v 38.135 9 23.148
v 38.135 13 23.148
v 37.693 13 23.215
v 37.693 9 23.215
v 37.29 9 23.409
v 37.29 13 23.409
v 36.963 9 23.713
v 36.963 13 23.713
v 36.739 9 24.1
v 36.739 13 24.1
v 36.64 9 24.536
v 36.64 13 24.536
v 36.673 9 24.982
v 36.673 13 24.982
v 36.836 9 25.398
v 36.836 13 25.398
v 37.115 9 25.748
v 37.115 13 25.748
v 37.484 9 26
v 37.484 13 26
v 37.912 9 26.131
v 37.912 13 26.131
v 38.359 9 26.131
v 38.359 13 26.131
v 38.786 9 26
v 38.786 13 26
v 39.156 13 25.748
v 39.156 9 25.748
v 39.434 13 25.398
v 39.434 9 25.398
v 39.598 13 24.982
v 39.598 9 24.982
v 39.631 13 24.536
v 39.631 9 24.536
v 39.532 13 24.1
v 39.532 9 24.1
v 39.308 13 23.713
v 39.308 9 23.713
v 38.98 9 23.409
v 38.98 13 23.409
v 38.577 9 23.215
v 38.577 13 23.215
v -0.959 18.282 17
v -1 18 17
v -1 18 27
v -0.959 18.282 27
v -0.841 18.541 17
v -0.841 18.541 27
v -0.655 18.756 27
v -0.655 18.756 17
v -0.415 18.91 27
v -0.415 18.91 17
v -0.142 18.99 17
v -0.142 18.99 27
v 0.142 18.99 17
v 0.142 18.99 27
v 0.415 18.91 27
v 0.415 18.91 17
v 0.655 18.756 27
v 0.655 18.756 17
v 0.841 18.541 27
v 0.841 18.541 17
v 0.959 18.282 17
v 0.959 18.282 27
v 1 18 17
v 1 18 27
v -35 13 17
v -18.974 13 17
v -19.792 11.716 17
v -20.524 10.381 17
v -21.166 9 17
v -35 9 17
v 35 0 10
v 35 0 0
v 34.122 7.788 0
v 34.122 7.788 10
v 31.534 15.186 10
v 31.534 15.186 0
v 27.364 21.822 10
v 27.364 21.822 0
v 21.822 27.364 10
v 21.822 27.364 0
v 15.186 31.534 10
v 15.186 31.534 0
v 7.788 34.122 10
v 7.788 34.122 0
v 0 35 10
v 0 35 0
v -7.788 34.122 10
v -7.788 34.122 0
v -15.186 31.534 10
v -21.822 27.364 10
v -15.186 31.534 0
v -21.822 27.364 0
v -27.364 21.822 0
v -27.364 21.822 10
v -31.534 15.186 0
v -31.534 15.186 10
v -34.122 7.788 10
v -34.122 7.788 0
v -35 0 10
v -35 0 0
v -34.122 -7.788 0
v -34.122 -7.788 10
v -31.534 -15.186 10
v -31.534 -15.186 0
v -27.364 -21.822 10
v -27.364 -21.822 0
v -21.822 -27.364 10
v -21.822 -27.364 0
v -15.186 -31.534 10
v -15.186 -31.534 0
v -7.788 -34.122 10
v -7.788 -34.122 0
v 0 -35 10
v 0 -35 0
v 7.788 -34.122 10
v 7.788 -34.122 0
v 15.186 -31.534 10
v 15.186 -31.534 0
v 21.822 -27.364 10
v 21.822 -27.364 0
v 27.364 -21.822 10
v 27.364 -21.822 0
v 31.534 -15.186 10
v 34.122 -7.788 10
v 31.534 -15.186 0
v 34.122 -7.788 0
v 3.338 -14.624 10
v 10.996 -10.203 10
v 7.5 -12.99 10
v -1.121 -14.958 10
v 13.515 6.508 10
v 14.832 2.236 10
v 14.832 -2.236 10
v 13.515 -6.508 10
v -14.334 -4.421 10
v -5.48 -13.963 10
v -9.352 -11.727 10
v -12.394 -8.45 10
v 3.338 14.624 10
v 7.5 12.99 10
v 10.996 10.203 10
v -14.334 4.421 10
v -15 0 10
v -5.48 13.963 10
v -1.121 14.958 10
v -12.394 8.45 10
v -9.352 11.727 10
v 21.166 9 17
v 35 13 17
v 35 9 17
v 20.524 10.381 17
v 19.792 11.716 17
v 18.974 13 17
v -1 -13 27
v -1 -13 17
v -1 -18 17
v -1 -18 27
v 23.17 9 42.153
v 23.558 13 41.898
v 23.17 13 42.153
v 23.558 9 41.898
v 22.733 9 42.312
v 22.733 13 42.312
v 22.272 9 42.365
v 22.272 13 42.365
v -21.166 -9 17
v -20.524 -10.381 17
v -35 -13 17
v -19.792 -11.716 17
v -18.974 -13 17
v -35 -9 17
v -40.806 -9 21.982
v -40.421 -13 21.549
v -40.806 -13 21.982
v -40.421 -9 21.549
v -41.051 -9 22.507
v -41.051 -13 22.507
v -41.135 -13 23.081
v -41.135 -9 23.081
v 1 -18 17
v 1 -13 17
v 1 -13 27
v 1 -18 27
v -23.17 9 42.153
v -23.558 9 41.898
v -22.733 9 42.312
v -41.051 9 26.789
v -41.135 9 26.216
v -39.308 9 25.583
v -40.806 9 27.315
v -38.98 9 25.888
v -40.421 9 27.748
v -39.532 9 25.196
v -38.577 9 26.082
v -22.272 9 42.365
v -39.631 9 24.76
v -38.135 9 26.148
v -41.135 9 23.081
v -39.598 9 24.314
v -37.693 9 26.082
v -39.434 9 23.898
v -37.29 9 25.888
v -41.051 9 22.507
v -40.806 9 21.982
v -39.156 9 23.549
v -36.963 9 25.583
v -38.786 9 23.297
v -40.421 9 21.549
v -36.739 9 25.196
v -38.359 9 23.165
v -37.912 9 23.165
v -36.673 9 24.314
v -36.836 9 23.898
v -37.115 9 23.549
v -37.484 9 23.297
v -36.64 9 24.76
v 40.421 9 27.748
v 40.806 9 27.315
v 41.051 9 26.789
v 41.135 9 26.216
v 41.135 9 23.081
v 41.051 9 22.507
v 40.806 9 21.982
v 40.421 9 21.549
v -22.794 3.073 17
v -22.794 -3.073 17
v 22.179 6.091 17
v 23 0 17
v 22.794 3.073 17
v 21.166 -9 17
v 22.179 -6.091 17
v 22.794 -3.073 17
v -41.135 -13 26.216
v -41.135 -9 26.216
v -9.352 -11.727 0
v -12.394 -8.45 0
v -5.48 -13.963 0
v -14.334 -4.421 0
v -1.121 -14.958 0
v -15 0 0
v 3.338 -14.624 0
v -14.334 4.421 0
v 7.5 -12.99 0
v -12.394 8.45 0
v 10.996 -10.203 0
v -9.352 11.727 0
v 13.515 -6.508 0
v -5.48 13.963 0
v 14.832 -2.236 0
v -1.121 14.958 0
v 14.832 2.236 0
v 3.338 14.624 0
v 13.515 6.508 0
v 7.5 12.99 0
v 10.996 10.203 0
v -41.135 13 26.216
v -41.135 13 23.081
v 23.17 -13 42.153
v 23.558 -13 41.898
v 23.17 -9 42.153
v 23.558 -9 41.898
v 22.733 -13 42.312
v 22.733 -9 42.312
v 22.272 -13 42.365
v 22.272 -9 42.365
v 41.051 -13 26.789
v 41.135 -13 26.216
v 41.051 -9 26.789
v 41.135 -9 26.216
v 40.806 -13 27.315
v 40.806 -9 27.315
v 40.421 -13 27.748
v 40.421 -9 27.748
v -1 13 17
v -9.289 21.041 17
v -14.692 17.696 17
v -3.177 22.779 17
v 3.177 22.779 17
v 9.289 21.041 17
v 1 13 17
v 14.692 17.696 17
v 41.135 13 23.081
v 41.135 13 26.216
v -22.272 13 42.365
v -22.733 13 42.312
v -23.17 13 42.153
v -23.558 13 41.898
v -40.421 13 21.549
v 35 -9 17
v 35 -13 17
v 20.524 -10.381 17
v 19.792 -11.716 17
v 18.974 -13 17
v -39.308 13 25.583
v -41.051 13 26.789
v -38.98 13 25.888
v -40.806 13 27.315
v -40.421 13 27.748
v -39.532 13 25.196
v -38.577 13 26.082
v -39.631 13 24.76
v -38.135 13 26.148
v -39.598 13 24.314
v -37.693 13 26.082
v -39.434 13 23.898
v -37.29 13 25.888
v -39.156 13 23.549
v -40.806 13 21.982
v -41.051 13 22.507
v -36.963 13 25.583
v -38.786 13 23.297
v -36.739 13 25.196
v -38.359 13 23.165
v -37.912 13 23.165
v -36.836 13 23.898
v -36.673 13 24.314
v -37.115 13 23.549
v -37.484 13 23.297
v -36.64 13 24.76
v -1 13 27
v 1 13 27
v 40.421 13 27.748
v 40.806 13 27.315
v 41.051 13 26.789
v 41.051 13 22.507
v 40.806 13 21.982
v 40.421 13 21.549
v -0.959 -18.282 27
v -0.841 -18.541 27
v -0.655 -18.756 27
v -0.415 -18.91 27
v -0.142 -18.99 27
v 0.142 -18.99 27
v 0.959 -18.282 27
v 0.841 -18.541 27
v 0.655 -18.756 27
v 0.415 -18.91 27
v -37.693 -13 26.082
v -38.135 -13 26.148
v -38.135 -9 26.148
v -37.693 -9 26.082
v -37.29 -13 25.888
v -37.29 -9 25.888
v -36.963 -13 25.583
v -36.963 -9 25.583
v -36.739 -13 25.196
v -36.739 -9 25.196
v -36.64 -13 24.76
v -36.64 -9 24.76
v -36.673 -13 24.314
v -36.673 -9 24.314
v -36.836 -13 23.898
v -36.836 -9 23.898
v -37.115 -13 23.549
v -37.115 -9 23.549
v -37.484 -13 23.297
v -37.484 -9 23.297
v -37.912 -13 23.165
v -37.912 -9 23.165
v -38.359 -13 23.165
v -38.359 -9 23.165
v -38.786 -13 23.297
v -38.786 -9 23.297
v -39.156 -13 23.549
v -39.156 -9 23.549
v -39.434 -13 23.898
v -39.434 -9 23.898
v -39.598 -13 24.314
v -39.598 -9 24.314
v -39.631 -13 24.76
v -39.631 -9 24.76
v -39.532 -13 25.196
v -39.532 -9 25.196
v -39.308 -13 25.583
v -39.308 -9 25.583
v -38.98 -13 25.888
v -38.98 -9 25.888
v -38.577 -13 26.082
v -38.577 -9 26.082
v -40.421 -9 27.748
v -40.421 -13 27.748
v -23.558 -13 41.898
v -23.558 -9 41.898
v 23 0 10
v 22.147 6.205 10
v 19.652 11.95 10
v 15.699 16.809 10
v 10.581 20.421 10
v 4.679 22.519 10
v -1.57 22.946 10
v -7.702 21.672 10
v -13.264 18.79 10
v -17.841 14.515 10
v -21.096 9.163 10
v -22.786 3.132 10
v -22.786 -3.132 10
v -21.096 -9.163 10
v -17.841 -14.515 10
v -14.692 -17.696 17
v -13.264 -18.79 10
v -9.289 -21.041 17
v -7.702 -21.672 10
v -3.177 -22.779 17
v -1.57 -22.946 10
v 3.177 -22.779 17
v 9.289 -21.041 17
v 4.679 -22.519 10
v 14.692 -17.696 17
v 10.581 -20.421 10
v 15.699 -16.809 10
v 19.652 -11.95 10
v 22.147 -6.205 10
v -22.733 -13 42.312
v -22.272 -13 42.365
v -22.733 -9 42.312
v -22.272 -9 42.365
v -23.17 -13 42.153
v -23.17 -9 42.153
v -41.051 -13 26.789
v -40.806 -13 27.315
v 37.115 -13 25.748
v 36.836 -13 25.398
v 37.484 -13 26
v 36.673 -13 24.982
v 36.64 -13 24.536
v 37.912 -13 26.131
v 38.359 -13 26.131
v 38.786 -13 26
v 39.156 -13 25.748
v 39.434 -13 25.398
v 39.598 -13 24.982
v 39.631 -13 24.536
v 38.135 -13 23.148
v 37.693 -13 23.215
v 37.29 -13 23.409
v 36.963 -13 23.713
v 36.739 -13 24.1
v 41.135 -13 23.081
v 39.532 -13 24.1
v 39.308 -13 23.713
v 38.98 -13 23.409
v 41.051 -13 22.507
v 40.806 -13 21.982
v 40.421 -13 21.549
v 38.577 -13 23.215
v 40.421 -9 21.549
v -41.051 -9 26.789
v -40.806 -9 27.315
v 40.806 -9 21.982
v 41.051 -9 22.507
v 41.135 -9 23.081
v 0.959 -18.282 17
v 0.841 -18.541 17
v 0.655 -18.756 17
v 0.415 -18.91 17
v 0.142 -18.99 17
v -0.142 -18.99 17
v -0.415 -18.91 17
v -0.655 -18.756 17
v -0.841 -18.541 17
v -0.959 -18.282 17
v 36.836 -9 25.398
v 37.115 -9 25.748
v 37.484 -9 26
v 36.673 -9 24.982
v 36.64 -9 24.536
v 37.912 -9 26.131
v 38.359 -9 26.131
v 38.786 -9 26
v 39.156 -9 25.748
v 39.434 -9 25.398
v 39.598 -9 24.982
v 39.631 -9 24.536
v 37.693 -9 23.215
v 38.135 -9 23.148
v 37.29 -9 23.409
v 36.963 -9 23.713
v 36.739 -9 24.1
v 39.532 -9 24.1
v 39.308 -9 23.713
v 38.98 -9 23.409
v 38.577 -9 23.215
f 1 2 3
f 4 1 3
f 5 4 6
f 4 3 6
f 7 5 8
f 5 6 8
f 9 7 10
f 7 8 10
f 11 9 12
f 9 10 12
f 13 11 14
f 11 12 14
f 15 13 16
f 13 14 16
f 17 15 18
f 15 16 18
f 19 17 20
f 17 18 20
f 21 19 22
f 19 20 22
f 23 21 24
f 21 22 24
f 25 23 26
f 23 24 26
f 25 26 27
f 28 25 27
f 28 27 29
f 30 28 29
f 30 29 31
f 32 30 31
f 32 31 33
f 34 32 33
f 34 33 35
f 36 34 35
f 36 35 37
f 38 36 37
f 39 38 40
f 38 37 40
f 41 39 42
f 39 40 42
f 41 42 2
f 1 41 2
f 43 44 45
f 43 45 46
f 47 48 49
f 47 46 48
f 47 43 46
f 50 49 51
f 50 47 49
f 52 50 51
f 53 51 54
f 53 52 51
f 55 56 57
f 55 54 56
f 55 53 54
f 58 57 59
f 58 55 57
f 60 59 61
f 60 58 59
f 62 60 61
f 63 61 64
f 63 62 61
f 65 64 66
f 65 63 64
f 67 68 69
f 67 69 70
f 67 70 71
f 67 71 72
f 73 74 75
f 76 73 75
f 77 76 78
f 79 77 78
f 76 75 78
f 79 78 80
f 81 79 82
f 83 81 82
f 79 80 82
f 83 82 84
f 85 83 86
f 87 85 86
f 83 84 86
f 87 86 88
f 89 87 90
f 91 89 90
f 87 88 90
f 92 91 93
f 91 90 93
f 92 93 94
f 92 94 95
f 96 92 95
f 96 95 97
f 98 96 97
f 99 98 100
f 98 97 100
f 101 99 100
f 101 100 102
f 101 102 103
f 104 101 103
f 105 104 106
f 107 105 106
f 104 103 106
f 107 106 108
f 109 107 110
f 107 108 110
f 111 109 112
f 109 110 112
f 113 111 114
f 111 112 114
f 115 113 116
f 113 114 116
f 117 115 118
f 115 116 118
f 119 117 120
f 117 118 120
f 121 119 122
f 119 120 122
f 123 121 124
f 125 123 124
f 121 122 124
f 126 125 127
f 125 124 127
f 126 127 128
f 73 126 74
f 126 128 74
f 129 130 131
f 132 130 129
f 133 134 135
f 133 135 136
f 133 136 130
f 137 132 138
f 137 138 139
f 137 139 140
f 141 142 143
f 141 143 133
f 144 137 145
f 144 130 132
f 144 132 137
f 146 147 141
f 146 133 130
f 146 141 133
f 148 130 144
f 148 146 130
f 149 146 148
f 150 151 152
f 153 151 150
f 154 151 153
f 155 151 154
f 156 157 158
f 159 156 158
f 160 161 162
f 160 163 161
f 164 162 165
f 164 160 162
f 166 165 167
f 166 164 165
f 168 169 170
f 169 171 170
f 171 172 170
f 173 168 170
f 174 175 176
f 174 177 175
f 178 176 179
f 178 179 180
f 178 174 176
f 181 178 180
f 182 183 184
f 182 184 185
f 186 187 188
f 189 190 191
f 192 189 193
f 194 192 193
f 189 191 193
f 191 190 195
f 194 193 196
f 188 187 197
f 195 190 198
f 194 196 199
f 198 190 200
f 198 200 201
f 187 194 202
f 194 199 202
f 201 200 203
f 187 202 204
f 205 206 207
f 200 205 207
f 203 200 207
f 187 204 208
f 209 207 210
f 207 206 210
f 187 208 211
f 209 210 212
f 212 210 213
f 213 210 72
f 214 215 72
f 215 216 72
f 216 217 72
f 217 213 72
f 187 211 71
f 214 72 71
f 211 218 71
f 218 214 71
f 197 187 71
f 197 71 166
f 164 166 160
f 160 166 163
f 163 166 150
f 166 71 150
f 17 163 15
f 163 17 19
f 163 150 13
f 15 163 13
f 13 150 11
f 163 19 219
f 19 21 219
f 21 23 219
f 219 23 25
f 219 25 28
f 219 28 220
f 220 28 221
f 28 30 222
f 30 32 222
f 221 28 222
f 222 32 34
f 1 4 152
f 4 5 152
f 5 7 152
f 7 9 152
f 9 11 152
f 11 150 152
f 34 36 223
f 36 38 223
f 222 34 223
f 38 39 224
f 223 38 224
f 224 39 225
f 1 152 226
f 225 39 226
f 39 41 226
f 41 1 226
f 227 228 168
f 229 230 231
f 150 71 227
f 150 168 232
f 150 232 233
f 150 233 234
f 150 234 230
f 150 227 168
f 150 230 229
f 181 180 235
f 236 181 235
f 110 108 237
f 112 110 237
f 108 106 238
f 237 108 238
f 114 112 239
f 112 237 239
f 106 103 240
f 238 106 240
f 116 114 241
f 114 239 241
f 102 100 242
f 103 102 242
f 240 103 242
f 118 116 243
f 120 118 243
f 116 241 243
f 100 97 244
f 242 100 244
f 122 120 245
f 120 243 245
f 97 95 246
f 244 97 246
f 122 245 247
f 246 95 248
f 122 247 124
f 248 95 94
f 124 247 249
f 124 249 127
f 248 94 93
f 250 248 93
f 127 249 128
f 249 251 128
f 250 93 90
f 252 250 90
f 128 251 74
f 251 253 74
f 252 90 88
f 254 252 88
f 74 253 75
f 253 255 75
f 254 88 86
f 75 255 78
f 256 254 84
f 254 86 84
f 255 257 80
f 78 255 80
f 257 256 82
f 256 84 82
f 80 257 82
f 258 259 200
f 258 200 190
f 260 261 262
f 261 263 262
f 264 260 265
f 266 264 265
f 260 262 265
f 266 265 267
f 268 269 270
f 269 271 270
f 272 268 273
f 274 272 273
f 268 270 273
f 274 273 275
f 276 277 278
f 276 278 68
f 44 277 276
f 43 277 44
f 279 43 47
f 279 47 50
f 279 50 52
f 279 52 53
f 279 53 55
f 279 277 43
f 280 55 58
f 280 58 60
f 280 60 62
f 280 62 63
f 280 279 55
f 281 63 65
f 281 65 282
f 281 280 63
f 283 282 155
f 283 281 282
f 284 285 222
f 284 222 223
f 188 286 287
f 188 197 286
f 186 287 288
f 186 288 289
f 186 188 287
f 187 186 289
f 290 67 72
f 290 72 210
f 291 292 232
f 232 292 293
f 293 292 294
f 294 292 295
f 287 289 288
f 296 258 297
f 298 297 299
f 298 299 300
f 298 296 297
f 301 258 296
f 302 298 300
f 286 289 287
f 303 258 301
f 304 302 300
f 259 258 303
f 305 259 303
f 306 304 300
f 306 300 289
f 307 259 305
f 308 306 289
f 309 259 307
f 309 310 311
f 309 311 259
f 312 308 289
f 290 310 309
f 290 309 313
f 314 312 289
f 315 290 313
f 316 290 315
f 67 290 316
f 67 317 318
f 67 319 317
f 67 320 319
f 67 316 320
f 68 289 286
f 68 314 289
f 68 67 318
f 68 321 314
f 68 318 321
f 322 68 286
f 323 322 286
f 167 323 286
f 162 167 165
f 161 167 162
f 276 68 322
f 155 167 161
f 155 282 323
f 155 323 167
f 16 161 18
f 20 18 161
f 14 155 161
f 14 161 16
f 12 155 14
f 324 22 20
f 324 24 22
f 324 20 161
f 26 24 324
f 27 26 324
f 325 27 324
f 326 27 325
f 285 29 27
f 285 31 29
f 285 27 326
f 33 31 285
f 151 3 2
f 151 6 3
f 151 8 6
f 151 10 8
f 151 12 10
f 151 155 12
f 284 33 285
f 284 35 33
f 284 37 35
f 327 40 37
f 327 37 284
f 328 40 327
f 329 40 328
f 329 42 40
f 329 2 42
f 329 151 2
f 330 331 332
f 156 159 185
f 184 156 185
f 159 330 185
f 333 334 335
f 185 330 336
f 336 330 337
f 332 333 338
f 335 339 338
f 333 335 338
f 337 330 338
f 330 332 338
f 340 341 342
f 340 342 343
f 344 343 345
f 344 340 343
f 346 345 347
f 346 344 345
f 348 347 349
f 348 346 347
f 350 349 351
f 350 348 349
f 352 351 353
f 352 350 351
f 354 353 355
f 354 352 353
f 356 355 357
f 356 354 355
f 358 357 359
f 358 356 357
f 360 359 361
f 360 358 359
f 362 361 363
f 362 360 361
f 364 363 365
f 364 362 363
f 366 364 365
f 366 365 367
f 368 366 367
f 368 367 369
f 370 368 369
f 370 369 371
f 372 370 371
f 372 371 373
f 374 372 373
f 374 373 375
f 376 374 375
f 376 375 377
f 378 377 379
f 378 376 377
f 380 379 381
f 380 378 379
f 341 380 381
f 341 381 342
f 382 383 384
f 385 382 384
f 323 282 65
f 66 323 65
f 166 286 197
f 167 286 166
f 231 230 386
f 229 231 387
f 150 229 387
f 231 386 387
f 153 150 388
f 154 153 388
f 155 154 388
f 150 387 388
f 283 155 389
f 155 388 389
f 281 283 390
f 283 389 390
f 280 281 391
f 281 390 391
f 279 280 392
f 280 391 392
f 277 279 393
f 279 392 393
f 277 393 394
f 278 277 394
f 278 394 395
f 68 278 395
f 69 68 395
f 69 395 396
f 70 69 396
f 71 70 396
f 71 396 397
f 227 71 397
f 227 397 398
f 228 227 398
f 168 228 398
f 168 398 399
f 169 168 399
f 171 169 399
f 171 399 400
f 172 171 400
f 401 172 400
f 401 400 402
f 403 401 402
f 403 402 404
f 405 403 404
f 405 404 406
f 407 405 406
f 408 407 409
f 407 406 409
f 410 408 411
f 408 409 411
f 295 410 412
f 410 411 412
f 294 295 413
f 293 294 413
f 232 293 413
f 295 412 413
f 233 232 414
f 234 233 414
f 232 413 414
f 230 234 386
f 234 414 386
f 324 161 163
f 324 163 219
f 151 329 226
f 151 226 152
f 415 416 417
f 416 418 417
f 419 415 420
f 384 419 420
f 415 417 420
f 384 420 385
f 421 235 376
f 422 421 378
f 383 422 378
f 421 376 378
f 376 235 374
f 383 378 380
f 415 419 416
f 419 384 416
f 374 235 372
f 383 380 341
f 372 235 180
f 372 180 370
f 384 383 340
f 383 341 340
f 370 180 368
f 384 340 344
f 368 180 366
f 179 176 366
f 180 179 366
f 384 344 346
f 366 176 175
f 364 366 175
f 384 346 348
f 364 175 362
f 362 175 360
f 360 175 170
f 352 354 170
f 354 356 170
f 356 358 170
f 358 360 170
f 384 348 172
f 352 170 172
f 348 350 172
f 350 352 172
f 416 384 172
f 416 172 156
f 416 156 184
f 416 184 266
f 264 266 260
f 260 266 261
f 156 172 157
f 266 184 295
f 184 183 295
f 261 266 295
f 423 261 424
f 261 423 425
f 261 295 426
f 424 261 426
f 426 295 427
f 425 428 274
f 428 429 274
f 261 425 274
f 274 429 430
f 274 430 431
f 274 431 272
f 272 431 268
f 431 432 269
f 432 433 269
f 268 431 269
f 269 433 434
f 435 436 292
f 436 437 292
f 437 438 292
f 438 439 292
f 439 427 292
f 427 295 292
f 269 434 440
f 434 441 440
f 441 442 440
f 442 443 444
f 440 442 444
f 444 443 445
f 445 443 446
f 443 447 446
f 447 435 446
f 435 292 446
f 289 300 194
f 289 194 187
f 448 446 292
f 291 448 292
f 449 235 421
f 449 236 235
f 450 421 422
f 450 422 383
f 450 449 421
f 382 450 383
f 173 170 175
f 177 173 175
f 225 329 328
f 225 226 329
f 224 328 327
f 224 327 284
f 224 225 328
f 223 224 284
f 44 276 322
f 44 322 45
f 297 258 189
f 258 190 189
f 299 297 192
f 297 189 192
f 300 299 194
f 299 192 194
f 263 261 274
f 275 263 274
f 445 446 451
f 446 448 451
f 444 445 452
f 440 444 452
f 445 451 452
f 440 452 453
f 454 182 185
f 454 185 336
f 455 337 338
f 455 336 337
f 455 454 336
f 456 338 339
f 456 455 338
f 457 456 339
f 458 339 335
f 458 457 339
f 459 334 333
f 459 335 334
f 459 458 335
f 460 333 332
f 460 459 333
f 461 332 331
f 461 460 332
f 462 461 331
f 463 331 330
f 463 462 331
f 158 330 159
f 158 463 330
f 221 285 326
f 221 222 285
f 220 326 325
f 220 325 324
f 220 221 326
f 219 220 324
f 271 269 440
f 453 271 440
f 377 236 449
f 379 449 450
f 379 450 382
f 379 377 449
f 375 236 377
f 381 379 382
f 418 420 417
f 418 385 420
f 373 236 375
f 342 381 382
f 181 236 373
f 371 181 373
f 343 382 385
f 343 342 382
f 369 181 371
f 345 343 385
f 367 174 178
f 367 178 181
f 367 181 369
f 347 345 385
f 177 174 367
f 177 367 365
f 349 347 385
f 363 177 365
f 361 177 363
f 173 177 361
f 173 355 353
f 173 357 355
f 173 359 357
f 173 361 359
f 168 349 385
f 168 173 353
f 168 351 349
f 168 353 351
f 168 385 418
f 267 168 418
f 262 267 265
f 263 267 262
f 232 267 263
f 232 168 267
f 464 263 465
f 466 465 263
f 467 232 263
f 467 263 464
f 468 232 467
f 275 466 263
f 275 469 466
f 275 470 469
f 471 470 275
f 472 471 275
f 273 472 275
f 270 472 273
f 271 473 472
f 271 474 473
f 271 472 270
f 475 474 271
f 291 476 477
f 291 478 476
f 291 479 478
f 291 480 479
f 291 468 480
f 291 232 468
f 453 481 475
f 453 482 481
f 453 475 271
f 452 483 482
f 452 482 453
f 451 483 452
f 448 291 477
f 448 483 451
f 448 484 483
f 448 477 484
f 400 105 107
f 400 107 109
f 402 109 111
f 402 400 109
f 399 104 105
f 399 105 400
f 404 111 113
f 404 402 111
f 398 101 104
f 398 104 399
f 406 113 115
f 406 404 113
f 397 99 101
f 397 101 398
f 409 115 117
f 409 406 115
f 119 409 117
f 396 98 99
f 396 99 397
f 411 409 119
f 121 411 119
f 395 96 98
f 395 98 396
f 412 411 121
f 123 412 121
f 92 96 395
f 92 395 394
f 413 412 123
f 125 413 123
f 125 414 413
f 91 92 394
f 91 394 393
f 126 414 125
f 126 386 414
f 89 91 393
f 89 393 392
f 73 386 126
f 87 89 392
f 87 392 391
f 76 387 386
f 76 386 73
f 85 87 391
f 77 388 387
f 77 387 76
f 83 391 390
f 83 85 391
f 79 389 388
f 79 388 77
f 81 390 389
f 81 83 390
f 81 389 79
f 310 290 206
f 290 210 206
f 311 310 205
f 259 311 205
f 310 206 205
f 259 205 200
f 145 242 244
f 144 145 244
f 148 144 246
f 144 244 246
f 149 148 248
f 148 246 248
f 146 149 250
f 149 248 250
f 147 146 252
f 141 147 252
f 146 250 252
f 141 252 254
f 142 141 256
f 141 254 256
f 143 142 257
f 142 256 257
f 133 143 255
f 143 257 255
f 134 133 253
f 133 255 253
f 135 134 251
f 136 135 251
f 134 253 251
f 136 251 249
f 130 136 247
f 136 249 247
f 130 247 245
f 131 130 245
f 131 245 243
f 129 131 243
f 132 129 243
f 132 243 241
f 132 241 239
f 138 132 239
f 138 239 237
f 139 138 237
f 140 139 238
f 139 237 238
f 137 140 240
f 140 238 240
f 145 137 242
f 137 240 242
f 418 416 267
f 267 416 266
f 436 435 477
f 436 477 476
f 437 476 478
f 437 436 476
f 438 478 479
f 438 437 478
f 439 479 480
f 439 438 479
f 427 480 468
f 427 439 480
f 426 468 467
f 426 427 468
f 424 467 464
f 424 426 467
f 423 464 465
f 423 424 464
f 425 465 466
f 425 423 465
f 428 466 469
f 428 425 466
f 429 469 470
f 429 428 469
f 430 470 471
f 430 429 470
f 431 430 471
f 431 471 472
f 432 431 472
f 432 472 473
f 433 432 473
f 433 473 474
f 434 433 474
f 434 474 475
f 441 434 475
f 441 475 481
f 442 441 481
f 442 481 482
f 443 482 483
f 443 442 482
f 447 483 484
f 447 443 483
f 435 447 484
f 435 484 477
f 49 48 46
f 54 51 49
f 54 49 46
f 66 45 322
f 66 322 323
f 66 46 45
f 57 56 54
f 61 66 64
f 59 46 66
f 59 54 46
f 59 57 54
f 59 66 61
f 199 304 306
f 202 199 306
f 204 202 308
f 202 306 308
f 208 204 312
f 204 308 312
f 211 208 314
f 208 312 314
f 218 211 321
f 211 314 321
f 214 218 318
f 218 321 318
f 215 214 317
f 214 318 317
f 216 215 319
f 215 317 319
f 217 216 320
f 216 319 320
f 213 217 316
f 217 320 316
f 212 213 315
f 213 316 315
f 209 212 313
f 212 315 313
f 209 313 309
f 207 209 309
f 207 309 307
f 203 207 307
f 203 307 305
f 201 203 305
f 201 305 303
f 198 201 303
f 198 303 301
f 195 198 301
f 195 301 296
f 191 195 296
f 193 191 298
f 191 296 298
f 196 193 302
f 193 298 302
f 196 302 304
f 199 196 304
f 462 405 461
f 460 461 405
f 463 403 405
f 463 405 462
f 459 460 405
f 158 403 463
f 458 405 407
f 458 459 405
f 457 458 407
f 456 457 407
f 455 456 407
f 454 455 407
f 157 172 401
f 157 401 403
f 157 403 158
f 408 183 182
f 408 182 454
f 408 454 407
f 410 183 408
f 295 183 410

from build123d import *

# Parameters (mm, degrees)
SKETCH1_R                   = 35
BOSS_EXTRUDE1_DEPTH         = 10
SKETCH2_R                   = 23
BOSS_EXTRUDE2_DEPTH         = 7
BOSS_EXTRUDE3_DEPTH         = 4
SKETCH4_R                   = 1.5
CUT_EXTRUDE1_DEPTH          = 4
FILLET1_R                   = 2
FILLET1_OF_MIRROR1_R        = 2
SKETCH5_W                   = 2
SKETCH5_H                   = 6
BOSS_EXTRUDE4_DEPTH         = 10
FILLET2_RADIUS              = 1
FILLET2_LENGTH              = 10
FILLET2_OF_MIRROR2_2_RADIUS = 1
FILLET2_OF_MIRROR2_2_LENGTH = 10
SKETCH6_R                   = 15
CUT_EXTRUDE2_DEPTH          = 10


with BuildPart() as part:
    # Sketch1 → Boss-Extrude1 (new body)
    with BuildSketch(Plane.XY):
        Circle(SKETCH1_R)
    extrude(amount=BOSS_EXTRUDE1_DEPTH)

    # Sketch2 → Boss-Extrude2 (add)
    with BuildSketch(Plane.XY.offset(10)):
        Circle(SKETCH2_R)
    extrude(amount=BOSS_EXTRUDE2_DEPTH)

    # Sketch3 → Boss-Extrude3 (add)
    with BuildSketch(Plane(origin=(0, 13, 0), x_dir=(1, 0, 0), z_dir=(0, 1, 0))):
        Polygon((35, -17), (-35, -17), (-41.135319403, -22.148144248), (-41.135319403, -27.148144248), (-23, -42.36548407), (23, -42.36548407), (41.135319403, -27.148144248), (41.135319403, -22.148144248), align=None)
    boss_extrude3 = extrude(amount=-BOSS_EXTRUDE3_DEPTH)

    # Sketch4 → Cut-Extrude1 (cut)
    with BuildSketch(Plane(origin=(0, 13, 0), x_dir=(1, 0, 0), z_dir=(0, 1, 0))):
        with Locations(Location((-38.135319403, -24.648144248, 0), (0, 0, 270))):
            Circle(SKETCH4_R)
        with Locations(Location((38.135319403, -24.648144248, 0), (0, 0, 90))):
            Circle(SKETCH4_R)
    cut_extrude1 = extrude(amount=-CUT_EXTRUDE1_DEPTH, mode=Mode.SUBTRACT)

    # Fillet1
    fillet1_edges = [part.edges().sort_by_distance(p)[0] for p in [
        (23, 11, 42.36548407),
        (-23, 11, 42.36548407),
        (-41.135319403, 11, 27.148144248),
        (-41.135319403, 11, 22.148144248),
        (41.135319403, 11, 22.148144248),
        (41.135319403, 11, 27.148144248),
    ]]
    fillet(fillet1_edges, radius=FILLET1_R)

    # Mirror1: Boss-Extrude3, Cut-Extrude1 across plane
    add(boss_extrude3.mirror(Plane.ZX))
    add(cut_extrude1.mirror(Plane.ZX), mode=Mode.SUBTRACT)

    # Fillet1 of Mirror1
    fillet1_of_mirror1_edges = [part.edges().sort_by_distance(p)[0] for p in [
        (23, -11, 42.36548407),
        (-23, -11, 42.36548407),
        (-41.135319403, -11, 27.148144248),
        (-41.135319403, -11, 22.148144248),
        (41.135319403, -11, 22.148144248),
        (41.135319403, -11, 27.148144248),
    ]]
    fillet(fillet1_of_mirror1_edges, radius=FILLET1_OF_MIRROR1_R)

    # Sketch5 → Boss-Extrude4 (add)
    with BuildSketch(Plane.XY.offset(17)):
        with Locations((0, 16)):
            Rectangle(SKETCH5_W, SKETCH5_H)
    boss_extrude4 = extrude(amount=BOSS_EXTRUDE4_DEPTH)

    # Fillet2: full round fillet: the end face becomes a half cylinder, R = half its width
    fillet2_face = Plane((0, 19, 22), x_dir=(0, 0, -1), z_dir=(0, 1, 0))  # on the end face: x along it, z out of the body
    fillet2_slab = fillet2_face.offset(-FILLET2_RADIUS / 2) * Box(FILLET2_LENGTH, 2 * FILLET2_RADIUS, FILLET2_RADIUS, mode=Mode.PRIVATE)  # the body's end, R deep
    fillet2_round = Plane((0, 18, 22), x_dir=(0, 1, 0), z_dir=(0, 0, -1)) * Cylinder(FILLET2_RADIUS, FILLET2_LENGTH, mode=Mode.PRIVATE)  # its axis R under the face
    add(fillet2_slab - fillet2_round, mode=Mode.SUBTRACT)

    # Mirror2: Boss-Extrude4 across plane
    add(boss_extrude4.mirror(Plane.ZX))

    # Fillet2 of Mirror2 2: full round fillet: the end face becomes a half cylinder, R = half its width
    fillet2_of_mirror2_2_face = Plane((0, -19, 22), x_dir=(0, 0, -1), z_dir=(0, -1, 0))  # on the end face: x along it, z out of the body
    fillet2_of_mirror2_2_slab = fillet2_of_mirror2_2_face.offset(-FILLET2_OF_MIRROR2_2_RADIUS / 2) * Box(FILLET2_OF_MIRROR2_2_LENGTH, 2 * FILLET2_OF_MIRROR2_2_RADIUS, FILLET2_OF_MIRROR2_2_RADIUS, mode=Mode.PRIVATE)  # the body's end, R deep
    fillet2_of_mirror2_2_round = Plane((0, -18, 22), x_dir=(0, -1, 0), z_dir=(0, 0, -1)) * Cylinder(FILLET2_OF_MIRROR2_2_RADIUS, FILLET2_OF_MIRROR2_2_LENGTH, mode=Mode.PRIVATE)  # its axis R under the face
    add(fillet2_of_mirror2_2_slab - fillet2_of_mirror2_2_round, mode=Mode.SUBTRACT)

    # Sketch6 → Cut-Extrude2 (cut)
    with BuildSketch(Plane(origin=(0, 0, 0), x_dir=(-1, 0, 0), z_dir=(0, 0, -1))):
        Circle(SKETCH6_R)
    extrude(amount=-CUT_EXTRUDE2_DEPTH, mode=Mode.SUBTRACT)


solid = part.part
